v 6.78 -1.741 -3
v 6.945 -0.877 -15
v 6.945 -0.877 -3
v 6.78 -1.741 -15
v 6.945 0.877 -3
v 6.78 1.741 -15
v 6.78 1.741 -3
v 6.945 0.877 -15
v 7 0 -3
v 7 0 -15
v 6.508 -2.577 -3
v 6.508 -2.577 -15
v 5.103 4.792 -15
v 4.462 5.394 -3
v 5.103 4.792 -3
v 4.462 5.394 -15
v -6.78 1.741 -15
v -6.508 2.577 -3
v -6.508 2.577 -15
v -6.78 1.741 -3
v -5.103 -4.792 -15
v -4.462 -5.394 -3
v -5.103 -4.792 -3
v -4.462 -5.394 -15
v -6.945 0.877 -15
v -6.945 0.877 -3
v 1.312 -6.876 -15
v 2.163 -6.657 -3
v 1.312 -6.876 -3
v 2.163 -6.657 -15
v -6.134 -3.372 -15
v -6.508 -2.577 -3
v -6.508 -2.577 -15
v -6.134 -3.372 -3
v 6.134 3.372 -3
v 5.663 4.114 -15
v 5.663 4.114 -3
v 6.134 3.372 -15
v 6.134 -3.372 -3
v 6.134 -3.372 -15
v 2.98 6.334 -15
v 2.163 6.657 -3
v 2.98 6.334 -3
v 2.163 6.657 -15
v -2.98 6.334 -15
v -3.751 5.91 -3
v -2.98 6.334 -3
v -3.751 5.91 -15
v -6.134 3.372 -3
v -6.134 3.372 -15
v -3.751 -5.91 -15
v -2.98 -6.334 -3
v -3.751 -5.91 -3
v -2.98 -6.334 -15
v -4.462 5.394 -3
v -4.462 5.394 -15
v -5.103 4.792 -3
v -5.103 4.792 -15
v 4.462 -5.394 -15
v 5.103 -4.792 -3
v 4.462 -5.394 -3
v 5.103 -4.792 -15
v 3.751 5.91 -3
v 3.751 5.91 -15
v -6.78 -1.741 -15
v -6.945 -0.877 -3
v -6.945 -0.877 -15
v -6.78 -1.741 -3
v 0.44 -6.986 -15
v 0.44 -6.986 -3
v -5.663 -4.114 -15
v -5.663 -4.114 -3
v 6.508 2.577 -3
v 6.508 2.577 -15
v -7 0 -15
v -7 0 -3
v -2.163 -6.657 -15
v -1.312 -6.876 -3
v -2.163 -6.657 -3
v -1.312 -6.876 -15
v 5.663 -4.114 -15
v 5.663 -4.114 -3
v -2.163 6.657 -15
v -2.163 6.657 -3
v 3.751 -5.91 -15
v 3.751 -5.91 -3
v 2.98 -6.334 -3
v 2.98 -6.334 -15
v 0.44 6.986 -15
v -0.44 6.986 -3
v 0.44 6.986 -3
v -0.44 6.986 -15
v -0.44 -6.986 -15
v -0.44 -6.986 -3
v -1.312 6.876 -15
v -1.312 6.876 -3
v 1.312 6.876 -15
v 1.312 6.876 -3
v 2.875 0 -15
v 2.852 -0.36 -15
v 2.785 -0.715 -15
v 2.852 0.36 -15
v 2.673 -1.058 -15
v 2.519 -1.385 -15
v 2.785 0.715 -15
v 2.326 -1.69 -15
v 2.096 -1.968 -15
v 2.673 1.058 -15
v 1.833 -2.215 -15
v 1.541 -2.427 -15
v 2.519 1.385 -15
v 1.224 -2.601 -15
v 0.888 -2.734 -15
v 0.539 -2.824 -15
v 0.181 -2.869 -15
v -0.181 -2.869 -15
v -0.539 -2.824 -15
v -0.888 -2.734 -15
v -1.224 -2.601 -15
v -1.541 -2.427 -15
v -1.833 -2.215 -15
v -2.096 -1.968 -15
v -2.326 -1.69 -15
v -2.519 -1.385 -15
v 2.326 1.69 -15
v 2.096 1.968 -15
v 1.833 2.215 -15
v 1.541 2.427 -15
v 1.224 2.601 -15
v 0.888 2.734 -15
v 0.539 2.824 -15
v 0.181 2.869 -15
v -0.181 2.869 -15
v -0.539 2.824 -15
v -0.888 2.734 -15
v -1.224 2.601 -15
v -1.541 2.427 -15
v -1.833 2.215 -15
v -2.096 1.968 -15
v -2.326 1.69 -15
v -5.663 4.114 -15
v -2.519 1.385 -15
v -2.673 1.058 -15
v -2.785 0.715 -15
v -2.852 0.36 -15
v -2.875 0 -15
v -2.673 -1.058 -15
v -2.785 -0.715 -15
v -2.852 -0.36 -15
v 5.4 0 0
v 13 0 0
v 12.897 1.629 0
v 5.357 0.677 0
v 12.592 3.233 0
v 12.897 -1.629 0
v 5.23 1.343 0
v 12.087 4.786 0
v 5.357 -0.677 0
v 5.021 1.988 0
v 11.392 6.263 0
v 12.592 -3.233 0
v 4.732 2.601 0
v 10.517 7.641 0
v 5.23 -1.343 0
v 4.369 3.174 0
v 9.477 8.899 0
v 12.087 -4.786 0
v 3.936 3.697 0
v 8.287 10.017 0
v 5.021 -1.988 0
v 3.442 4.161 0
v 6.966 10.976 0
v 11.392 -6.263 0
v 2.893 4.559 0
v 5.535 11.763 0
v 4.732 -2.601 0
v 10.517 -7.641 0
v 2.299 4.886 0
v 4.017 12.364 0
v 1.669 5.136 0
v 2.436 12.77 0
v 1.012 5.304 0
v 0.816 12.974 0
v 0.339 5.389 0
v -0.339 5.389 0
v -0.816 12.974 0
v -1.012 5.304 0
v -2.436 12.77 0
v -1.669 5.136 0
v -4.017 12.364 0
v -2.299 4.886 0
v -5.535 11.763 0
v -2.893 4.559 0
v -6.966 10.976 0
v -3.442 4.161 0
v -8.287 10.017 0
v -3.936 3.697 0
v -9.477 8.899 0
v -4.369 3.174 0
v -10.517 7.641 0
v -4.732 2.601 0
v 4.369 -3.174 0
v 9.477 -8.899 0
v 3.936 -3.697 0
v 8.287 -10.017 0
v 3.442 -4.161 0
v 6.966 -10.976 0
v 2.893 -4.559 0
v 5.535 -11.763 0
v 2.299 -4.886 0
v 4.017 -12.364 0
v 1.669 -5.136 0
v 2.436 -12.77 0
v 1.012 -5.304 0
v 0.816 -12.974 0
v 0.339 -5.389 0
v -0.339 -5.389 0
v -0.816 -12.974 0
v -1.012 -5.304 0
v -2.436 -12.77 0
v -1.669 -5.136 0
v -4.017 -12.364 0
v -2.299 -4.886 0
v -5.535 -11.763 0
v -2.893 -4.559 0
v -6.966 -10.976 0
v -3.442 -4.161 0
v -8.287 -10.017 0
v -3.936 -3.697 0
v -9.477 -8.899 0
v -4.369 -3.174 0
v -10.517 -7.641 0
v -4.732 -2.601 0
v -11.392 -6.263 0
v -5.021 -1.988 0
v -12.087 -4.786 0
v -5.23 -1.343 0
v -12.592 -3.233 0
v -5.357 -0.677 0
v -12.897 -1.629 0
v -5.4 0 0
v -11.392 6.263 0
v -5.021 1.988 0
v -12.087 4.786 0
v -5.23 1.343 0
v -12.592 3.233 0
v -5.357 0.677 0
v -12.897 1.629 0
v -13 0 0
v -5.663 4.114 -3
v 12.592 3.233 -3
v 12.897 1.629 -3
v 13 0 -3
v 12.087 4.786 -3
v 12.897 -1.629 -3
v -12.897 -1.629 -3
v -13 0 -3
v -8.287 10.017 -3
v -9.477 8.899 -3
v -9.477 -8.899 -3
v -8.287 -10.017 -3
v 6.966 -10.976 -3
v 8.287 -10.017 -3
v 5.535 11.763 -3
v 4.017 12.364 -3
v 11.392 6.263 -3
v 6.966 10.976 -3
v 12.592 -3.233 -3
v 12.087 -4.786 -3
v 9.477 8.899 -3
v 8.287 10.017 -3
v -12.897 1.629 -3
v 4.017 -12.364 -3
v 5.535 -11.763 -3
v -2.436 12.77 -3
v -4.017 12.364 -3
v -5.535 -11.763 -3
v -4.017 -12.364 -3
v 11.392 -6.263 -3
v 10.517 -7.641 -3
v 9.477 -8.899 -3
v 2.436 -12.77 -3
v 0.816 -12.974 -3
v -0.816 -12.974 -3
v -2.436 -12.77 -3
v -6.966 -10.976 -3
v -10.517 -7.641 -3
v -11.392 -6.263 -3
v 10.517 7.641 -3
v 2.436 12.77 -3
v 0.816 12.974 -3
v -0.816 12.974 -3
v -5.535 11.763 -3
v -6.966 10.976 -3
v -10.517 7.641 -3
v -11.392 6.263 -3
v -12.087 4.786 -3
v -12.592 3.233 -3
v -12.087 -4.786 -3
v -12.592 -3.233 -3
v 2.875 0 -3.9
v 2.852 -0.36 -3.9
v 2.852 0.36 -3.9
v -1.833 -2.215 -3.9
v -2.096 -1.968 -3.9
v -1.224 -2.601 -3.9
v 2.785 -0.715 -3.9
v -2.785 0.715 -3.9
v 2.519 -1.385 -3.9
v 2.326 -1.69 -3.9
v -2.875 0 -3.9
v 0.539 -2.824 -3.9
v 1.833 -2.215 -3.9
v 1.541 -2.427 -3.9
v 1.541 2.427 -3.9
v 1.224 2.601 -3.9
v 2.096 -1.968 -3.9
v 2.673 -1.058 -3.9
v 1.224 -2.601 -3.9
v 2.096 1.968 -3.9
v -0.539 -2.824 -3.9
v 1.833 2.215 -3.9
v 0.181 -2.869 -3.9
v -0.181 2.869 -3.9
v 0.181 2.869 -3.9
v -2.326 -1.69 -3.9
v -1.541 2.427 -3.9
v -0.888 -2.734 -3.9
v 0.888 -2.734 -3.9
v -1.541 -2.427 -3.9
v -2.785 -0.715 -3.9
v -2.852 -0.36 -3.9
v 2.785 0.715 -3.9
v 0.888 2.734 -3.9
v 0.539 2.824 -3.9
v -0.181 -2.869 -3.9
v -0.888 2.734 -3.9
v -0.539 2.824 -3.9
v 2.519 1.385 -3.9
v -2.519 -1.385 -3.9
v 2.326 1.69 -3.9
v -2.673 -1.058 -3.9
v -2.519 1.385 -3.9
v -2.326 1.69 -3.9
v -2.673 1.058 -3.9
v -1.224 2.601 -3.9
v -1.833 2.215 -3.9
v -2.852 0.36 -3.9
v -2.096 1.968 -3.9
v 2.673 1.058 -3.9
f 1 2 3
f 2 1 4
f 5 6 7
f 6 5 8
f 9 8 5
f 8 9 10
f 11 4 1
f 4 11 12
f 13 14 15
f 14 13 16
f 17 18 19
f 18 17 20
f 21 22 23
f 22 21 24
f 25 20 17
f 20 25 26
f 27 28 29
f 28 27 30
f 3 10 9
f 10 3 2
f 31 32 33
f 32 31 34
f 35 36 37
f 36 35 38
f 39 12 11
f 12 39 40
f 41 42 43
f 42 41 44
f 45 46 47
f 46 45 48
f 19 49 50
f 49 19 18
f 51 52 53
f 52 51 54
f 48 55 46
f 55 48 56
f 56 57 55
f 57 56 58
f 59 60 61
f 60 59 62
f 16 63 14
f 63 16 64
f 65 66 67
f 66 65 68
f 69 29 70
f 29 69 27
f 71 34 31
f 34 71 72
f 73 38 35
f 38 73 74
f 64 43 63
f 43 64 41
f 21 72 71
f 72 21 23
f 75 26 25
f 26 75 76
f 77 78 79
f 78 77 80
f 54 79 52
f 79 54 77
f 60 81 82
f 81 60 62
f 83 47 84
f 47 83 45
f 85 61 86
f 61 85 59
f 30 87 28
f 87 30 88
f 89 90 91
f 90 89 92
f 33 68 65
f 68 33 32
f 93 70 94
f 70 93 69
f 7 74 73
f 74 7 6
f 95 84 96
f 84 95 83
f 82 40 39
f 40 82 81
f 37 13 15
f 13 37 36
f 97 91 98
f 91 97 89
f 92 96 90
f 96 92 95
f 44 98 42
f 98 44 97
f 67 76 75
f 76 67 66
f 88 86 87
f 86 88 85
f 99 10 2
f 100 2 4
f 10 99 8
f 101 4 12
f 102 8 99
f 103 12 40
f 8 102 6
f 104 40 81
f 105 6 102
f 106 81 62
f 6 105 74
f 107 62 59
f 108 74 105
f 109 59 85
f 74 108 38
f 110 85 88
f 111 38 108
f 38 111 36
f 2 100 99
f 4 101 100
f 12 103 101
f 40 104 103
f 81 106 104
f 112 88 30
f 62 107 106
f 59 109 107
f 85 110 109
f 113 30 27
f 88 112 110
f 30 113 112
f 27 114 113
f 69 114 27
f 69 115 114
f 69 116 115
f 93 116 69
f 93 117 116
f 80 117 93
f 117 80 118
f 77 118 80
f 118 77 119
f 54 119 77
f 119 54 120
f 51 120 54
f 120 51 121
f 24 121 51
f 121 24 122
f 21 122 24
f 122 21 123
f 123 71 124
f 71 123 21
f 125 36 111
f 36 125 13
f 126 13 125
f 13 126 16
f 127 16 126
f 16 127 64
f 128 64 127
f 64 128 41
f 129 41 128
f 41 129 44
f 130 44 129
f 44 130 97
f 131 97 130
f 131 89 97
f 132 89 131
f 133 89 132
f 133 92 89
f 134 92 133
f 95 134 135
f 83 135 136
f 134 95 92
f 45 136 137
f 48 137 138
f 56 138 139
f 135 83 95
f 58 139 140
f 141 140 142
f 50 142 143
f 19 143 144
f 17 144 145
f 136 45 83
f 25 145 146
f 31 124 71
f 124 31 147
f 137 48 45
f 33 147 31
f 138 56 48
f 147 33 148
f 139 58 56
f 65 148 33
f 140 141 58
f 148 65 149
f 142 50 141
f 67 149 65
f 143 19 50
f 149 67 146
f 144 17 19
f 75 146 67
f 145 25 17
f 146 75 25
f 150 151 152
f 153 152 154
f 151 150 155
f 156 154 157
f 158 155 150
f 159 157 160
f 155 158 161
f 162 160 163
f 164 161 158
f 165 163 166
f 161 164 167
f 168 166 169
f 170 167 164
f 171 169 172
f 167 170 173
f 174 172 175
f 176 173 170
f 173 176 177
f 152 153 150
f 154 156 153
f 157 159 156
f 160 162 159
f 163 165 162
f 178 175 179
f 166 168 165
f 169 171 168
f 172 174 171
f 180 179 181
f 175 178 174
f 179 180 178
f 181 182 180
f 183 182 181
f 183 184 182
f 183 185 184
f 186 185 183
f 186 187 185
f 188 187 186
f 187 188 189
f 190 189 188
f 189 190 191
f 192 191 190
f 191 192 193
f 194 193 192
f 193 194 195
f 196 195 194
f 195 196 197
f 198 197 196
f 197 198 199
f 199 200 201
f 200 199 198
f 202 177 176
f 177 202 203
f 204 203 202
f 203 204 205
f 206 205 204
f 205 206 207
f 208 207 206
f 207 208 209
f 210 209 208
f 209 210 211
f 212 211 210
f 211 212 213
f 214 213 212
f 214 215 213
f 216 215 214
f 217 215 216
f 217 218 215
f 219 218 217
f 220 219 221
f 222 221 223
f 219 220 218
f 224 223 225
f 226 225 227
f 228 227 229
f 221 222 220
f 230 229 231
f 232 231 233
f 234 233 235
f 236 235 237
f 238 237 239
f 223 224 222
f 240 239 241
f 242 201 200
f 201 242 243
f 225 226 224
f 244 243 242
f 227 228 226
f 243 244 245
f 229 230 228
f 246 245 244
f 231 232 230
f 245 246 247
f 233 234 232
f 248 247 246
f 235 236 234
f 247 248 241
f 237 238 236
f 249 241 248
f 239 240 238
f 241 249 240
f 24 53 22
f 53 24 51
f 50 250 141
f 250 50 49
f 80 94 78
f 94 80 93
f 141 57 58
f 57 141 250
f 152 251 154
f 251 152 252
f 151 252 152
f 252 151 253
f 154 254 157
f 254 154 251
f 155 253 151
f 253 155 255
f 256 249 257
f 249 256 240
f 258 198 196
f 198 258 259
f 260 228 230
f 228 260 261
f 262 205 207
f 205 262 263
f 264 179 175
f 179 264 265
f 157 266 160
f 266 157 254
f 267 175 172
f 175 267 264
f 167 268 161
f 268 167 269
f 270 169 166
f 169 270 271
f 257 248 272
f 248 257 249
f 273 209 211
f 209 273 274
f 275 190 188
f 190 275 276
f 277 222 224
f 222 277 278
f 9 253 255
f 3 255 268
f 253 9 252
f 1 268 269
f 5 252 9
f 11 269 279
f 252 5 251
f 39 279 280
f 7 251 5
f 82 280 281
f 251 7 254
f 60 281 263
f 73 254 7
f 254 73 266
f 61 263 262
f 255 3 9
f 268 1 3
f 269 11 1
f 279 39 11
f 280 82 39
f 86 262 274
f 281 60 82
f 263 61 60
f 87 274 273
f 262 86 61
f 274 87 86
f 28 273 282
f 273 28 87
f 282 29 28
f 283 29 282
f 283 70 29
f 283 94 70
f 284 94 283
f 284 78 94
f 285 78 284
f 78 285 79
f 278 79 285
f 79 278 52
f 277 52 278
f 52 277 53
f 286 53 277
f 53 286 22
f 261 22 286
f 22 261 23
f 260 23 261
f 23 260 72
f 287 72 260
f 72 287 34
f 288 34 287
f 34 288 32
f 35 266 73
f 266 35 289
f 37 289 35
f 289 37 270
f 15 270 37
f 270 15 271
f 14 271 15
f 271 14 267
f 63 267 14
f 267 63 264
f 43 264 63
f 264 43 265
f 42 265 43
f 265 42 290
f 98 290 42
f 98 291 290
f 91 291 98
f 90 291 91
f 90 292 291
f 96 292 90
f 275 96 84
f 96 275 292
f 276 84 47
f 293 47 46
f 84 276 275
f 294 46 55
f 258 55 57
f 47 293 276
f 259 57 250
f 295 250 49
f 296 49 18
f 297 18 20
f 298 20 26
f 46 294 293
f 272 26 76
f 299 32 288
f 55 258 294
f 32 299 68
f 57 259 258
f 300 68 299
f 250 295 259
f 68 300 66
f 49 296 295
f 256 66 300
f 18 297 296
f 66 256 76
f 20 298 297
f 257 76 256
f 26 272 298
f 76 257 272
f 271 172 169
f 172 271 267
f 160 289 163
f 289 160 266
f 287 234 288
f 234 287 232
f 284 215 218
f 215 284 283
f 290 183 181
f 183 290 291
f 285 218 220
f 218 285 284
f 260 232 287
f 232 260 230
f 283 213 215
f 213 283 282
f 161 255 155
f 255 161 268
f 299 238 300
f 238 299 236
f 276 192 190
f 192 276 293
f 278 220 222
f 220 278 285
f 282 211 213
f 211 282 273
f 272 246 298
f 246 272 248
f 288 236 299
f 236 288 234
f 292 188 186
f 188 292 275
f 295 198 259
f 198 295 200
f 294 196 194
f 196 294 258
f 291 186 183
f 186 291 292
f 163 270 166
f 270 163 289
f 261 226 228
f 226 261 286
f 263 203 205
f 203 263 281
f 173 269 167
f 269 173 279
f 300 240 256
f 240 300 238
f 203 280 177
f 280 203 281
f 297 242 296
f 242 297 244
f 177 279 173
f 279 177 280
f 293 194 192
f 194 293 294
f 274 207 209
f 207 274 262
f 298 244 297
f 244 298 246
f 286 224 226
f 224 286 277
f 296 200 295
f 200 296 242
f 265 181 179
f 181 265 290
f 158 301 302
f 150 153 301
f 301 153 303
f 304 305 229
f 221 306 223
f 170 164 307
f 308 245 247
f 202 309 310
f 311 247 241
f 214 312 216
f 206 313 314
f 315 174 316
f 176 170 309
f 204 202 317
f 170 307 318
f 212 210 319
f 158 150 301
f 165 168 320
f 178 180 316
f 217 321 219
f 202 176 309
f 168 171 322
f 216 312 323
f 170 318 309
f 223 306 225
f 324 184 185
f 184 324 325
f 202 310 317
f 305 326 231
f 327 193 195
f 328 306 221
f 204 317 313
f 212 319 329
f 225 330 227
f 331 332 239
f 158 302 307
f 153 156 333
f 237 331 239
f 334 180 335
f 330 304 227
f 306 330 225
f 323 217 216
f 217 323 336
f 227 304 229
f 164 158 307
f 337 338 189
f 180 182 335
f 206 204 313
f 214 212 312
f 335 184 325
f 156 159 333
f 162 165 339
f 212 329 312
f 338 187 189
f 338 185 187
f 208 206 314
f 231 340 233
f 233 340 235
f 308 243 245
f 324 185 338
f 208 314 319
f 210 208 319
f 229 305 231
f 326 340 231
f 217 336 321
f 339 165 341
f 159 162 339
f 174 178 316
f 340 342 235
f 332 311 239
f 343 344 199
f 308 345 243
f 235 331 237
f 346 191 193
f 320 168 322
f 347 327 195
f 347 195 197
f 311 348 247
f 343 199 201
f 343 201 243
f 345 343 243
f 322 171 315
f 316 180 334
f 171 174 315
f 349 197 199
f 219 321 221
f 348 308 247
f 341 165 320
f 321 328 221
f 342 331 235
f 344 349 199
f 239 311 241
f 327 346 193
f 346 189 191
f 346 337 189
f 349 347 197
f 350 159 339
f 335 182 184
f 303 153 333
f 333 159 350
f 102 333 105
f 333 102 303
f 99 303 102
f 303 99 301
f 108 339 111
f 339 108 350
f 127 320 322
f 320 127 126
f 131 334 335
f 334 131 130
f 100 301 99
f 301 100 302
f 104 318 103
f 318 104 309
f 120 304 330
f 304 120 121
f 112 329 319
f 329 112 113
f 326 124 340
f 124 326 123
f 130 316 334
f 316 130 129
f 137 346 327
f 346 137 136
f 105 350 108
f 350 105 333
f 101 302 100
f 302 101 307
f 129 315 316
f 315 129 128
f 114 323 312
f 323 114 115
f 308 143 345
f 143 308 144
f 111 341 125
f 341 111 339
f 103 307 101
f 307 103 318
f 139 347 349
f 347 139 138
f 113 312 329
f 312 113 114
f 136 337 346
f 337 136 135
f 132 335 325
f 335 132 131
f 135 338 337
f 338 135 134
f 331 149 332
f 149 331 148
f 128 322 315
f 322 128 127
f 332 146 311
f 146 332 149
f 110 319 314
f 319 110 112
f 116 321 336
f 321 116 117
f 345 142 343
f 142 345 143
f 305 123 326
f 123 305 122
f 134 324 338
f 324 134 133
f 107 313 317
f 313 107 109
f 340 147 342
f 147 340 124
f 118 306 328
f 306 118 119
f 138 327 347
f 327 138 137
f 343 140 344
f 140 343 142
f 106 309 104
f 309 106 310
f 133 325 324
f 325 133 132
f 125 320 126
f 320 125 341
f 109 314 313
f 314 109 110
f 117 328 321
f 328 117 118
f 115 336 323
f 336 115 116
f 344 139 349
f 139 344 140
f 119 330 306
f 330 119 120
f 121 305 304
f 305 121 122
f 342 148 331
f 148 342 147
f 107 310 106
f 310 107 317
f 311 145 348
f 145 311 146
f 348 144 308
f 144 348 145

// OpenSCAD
$fn = 50;


difference() {
	union() {
		translate(v = [0, 0, -15.0000000000]) {
			cylinder(h = 15, r = 7.0000000000);
		}
		translate(v = [0, 0, -3.0000000000]) {
			cylinder(h = 3, r = 13.0000000000);
		}
	}
	union() {
		translate(v = [0, 0, 0]) {
			rotate(a = [0, 0, 0]) {
				difference() {
					union() {
						#translate(v = [0, 0, -15.0000000000]) {
							cylinder(h = 15, r = 2.6000000000);
						}
						#translate(v = [0, 0, -3.9000000000]) {
							cylinder(h = 3.9000000000, r1 = 2.8750000000, r2 = 5.4000000000);
						}
						#translate(v = [0, 0, -15.0000000000]) {
							cylinder(h = 15, r = 2.8750000000);
						}
						#translate(v = [0, 0, -15.0000000000]) {
							cylinder(h = 15, r = 2.6000000000);
						}
					}
					union();
				}
			}
		}
	}
}
